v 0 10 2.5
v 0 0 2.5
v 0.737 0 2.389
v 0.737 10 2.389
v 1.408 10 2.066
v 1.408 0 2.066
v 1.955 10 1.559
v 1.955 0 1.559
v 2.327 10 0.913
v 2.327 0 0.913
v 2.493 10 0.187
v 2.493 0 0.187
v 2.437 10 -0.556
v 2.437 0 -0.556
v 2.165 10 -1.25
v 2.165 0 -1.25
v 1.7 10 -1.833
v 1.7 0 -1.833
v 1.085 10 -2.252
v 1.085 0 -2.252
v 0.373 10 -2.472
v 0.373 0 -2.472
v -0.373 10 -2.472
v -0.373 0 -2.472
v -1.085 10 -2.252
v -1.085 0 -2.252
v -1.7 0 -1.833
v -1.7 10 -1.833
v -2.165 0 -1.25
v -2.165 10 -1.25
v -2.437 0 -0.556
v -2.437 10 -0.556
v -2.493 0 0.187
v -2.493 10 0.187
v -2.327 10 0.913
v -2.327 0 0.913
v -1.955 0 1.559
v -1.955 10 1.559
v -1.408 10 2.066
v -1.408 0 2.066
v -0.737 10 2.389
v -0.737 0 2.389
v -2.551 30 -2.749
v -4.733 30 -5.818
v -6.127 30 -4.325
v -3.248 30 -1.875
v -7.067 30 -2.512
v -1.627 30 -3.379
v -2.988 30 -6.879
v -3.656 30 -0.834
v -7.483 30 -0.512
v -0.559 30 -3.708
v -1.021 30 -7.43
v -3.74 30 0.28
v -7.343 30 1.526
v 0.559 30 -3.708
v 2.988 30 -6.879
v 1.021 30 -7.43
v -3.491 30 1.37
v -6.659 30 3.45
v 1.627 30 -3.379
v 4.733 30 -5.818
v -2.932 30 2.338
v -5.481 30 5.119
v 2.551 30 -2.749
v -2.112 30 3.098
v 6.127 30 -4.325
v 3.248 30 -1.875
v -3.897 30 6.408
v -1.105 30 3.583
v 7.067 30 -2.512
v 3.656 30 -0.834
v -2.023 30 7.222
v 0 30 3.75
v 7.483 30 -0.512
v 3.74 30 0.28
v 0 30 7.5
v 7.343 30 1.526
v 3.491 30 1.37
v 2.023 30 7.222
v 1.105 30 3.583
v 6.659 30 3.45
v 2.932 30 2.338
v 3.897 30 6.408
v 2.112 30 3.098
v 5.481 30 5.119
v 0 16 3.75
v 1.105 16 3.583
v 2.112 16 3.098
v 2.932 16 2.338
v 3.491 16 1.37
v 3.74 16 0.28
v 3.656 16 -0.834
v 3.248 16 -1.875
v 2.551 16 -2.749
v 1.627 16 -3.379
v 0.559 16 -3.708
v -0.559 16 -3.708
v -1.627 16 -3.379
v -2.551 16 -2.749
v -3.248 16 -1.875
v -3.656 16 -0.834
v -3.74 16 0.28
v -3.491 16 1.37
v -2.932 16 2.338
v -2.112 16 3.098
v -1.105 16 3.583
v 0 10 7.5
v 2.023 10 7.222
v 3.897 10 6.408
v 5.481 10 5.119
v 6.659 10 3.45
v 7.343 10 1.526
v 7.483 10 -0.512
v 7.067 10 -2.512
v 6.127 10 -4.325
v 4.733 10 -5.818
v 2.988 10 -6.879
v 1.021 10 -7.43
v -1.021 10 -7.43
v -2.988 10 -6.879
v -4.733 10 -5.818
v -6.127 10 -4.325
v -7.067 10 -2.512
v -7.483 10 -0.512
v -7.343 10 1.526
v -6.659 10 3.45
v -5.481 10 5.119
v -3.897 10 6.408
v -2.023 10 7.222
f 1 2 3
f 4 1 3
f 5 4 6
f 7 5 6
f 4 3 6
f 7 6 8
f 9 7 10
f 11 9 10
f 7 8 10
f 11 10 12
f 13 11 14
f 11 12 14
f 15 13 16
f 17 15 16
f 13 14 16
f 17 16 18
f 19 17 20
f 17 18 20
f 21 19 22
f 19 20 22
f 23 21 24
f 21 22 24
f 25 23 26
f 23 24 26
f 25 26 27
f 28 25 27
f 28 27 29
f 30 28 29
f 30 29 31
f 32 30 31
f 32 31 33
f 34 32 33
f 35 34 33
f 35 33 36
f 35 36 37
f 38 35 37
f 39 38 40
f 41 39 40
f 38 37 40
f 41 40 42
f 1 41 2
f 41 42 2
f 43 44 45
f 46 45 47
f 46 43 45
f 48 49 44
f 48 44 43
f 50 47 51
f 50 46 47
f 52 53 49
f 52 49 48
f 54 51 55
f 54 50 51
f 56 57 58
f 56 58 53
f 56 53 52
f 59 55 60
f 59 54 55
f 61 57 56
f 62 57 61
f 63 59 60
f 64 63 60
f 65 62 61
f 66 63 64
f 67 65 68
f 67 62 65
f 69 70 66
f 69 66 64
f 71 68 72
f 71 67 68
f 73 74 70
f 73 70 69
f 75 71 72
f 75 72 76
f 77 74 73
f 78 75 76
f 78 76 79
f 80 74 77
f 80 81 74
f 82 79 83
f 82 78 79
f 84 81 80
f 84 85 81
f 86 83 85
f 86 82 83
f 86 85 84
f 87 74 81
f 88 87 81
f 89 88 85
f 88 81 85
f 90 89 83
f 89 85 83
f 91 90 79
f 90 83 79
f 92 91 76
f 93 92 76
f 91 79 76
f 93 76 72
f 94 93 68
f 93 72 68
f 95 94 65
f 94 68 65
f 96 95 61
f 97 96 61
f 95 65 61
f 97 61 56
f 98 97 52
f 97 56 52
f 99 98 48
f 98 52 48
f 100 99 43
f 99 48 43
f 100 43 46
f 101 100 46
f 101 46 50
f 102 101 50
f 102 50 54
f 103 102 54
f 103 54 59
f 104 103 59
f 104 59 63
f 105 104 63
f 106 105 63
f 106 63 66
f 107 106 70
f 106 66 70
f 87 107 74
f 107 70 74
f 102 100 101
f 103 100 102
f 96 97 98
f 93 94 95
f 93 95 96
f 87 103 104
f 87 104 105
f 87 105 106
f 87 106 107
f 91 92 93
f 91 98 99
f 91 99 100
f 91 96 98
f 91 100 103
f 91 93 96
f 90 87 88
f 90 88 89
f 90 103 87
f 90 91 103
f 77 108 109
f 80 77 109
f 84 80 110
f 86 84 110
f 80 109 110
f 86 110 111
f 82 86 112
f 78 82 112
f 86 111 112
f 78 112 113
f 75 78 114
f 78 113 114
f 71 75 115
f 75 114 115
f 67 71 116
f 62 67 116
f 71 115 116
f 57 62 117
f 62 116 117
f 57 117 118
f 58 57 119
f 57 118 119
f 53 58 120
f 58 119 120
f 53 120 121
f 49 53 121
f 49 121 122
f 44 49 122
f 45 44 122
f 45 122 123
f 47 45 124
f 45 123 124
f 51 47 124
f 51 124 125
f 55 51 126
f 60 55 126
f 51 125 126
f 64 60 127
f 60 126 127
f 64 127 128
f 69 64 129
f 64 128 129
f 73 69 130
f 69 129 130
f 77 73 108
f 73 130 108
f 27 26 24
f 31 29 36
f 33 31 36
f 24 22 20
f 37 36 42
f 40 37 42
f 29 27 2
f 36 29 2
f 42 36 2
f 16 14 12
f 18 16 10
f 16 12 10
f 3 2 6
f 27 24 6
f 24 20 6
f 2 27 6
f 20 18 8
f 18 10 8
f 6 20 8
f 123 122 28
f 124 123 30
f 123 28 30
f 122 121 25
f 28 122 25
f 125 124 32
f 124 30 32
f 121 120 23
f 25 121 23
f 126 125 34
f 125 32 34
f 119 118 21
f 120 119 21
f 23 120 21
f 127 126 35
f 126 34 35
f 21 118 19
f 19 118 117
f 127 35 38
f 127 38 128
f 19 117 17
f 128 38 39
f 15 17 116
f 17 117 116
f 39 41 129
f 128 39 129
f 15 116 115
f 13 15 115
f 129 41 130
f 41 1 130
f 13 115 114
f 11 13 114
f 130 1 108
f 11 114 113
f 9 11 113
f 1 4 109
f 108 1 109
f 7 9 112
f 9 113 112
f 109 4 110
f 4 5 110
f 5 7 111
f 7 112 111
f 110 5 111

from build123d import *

# Parameters (mm, degrees)
SKETCH1_R           = 2.5
BOSS_EXTRUDE2_DEPTH = 10
SKETCH2_R           = 7.5
BOSS_EXTRUDE3_DEPTH = 20
SKETCH3_R           = 3.75
CUT_EXTRUDE1_DEPTH  = 14


with BuildPart() as part:
    # Sketch1 → Boss-Extrude2 (new body)
    with BuildSketch(Plane(origin=(0, 0, 0), x_dir=(1, 0, 0), z_dir=(0, 1, 0))):
        with Locations(Location((0, 0, 0), (0, 0, 270))):  # turned: the seam where the file's is
            Circle(SKETCH1_R)
    extrude(amount=BOSS_EXTRUDE2_DEPTH)

    # Sketch2 → Boss-Extrude3 (add)
    with BuildSketch(Plane(origin=(0, 10, 0), x_dir=(1, 0, 0), z_dir=(0, 1, 0))):
        with Locations(Location((0, 0, 0), (0, 0, 270))):  # turned: the seam where the file's is
            Circle(SKETCH2_R)
    extrude(amount=BOSS_EXTRUDE3_DEPTH)

    # Sketch3 → Cut-Extrude1 (cut)
    with BuildSketch(Plane(origin=(0, 30, 0), x_dir=(1, 0, 0), z_dir=(0, 1, 0))):
        with Locations(Location((0, 0, 0), (0, 0, 270))):  # turned: the seam where the file's is
            Circle(SKETCH3_R)
    extrude(amount=-CUT_EXTRUDE1_DEPTH, mode=Mode.SUBTRACT)


solid = part.part
